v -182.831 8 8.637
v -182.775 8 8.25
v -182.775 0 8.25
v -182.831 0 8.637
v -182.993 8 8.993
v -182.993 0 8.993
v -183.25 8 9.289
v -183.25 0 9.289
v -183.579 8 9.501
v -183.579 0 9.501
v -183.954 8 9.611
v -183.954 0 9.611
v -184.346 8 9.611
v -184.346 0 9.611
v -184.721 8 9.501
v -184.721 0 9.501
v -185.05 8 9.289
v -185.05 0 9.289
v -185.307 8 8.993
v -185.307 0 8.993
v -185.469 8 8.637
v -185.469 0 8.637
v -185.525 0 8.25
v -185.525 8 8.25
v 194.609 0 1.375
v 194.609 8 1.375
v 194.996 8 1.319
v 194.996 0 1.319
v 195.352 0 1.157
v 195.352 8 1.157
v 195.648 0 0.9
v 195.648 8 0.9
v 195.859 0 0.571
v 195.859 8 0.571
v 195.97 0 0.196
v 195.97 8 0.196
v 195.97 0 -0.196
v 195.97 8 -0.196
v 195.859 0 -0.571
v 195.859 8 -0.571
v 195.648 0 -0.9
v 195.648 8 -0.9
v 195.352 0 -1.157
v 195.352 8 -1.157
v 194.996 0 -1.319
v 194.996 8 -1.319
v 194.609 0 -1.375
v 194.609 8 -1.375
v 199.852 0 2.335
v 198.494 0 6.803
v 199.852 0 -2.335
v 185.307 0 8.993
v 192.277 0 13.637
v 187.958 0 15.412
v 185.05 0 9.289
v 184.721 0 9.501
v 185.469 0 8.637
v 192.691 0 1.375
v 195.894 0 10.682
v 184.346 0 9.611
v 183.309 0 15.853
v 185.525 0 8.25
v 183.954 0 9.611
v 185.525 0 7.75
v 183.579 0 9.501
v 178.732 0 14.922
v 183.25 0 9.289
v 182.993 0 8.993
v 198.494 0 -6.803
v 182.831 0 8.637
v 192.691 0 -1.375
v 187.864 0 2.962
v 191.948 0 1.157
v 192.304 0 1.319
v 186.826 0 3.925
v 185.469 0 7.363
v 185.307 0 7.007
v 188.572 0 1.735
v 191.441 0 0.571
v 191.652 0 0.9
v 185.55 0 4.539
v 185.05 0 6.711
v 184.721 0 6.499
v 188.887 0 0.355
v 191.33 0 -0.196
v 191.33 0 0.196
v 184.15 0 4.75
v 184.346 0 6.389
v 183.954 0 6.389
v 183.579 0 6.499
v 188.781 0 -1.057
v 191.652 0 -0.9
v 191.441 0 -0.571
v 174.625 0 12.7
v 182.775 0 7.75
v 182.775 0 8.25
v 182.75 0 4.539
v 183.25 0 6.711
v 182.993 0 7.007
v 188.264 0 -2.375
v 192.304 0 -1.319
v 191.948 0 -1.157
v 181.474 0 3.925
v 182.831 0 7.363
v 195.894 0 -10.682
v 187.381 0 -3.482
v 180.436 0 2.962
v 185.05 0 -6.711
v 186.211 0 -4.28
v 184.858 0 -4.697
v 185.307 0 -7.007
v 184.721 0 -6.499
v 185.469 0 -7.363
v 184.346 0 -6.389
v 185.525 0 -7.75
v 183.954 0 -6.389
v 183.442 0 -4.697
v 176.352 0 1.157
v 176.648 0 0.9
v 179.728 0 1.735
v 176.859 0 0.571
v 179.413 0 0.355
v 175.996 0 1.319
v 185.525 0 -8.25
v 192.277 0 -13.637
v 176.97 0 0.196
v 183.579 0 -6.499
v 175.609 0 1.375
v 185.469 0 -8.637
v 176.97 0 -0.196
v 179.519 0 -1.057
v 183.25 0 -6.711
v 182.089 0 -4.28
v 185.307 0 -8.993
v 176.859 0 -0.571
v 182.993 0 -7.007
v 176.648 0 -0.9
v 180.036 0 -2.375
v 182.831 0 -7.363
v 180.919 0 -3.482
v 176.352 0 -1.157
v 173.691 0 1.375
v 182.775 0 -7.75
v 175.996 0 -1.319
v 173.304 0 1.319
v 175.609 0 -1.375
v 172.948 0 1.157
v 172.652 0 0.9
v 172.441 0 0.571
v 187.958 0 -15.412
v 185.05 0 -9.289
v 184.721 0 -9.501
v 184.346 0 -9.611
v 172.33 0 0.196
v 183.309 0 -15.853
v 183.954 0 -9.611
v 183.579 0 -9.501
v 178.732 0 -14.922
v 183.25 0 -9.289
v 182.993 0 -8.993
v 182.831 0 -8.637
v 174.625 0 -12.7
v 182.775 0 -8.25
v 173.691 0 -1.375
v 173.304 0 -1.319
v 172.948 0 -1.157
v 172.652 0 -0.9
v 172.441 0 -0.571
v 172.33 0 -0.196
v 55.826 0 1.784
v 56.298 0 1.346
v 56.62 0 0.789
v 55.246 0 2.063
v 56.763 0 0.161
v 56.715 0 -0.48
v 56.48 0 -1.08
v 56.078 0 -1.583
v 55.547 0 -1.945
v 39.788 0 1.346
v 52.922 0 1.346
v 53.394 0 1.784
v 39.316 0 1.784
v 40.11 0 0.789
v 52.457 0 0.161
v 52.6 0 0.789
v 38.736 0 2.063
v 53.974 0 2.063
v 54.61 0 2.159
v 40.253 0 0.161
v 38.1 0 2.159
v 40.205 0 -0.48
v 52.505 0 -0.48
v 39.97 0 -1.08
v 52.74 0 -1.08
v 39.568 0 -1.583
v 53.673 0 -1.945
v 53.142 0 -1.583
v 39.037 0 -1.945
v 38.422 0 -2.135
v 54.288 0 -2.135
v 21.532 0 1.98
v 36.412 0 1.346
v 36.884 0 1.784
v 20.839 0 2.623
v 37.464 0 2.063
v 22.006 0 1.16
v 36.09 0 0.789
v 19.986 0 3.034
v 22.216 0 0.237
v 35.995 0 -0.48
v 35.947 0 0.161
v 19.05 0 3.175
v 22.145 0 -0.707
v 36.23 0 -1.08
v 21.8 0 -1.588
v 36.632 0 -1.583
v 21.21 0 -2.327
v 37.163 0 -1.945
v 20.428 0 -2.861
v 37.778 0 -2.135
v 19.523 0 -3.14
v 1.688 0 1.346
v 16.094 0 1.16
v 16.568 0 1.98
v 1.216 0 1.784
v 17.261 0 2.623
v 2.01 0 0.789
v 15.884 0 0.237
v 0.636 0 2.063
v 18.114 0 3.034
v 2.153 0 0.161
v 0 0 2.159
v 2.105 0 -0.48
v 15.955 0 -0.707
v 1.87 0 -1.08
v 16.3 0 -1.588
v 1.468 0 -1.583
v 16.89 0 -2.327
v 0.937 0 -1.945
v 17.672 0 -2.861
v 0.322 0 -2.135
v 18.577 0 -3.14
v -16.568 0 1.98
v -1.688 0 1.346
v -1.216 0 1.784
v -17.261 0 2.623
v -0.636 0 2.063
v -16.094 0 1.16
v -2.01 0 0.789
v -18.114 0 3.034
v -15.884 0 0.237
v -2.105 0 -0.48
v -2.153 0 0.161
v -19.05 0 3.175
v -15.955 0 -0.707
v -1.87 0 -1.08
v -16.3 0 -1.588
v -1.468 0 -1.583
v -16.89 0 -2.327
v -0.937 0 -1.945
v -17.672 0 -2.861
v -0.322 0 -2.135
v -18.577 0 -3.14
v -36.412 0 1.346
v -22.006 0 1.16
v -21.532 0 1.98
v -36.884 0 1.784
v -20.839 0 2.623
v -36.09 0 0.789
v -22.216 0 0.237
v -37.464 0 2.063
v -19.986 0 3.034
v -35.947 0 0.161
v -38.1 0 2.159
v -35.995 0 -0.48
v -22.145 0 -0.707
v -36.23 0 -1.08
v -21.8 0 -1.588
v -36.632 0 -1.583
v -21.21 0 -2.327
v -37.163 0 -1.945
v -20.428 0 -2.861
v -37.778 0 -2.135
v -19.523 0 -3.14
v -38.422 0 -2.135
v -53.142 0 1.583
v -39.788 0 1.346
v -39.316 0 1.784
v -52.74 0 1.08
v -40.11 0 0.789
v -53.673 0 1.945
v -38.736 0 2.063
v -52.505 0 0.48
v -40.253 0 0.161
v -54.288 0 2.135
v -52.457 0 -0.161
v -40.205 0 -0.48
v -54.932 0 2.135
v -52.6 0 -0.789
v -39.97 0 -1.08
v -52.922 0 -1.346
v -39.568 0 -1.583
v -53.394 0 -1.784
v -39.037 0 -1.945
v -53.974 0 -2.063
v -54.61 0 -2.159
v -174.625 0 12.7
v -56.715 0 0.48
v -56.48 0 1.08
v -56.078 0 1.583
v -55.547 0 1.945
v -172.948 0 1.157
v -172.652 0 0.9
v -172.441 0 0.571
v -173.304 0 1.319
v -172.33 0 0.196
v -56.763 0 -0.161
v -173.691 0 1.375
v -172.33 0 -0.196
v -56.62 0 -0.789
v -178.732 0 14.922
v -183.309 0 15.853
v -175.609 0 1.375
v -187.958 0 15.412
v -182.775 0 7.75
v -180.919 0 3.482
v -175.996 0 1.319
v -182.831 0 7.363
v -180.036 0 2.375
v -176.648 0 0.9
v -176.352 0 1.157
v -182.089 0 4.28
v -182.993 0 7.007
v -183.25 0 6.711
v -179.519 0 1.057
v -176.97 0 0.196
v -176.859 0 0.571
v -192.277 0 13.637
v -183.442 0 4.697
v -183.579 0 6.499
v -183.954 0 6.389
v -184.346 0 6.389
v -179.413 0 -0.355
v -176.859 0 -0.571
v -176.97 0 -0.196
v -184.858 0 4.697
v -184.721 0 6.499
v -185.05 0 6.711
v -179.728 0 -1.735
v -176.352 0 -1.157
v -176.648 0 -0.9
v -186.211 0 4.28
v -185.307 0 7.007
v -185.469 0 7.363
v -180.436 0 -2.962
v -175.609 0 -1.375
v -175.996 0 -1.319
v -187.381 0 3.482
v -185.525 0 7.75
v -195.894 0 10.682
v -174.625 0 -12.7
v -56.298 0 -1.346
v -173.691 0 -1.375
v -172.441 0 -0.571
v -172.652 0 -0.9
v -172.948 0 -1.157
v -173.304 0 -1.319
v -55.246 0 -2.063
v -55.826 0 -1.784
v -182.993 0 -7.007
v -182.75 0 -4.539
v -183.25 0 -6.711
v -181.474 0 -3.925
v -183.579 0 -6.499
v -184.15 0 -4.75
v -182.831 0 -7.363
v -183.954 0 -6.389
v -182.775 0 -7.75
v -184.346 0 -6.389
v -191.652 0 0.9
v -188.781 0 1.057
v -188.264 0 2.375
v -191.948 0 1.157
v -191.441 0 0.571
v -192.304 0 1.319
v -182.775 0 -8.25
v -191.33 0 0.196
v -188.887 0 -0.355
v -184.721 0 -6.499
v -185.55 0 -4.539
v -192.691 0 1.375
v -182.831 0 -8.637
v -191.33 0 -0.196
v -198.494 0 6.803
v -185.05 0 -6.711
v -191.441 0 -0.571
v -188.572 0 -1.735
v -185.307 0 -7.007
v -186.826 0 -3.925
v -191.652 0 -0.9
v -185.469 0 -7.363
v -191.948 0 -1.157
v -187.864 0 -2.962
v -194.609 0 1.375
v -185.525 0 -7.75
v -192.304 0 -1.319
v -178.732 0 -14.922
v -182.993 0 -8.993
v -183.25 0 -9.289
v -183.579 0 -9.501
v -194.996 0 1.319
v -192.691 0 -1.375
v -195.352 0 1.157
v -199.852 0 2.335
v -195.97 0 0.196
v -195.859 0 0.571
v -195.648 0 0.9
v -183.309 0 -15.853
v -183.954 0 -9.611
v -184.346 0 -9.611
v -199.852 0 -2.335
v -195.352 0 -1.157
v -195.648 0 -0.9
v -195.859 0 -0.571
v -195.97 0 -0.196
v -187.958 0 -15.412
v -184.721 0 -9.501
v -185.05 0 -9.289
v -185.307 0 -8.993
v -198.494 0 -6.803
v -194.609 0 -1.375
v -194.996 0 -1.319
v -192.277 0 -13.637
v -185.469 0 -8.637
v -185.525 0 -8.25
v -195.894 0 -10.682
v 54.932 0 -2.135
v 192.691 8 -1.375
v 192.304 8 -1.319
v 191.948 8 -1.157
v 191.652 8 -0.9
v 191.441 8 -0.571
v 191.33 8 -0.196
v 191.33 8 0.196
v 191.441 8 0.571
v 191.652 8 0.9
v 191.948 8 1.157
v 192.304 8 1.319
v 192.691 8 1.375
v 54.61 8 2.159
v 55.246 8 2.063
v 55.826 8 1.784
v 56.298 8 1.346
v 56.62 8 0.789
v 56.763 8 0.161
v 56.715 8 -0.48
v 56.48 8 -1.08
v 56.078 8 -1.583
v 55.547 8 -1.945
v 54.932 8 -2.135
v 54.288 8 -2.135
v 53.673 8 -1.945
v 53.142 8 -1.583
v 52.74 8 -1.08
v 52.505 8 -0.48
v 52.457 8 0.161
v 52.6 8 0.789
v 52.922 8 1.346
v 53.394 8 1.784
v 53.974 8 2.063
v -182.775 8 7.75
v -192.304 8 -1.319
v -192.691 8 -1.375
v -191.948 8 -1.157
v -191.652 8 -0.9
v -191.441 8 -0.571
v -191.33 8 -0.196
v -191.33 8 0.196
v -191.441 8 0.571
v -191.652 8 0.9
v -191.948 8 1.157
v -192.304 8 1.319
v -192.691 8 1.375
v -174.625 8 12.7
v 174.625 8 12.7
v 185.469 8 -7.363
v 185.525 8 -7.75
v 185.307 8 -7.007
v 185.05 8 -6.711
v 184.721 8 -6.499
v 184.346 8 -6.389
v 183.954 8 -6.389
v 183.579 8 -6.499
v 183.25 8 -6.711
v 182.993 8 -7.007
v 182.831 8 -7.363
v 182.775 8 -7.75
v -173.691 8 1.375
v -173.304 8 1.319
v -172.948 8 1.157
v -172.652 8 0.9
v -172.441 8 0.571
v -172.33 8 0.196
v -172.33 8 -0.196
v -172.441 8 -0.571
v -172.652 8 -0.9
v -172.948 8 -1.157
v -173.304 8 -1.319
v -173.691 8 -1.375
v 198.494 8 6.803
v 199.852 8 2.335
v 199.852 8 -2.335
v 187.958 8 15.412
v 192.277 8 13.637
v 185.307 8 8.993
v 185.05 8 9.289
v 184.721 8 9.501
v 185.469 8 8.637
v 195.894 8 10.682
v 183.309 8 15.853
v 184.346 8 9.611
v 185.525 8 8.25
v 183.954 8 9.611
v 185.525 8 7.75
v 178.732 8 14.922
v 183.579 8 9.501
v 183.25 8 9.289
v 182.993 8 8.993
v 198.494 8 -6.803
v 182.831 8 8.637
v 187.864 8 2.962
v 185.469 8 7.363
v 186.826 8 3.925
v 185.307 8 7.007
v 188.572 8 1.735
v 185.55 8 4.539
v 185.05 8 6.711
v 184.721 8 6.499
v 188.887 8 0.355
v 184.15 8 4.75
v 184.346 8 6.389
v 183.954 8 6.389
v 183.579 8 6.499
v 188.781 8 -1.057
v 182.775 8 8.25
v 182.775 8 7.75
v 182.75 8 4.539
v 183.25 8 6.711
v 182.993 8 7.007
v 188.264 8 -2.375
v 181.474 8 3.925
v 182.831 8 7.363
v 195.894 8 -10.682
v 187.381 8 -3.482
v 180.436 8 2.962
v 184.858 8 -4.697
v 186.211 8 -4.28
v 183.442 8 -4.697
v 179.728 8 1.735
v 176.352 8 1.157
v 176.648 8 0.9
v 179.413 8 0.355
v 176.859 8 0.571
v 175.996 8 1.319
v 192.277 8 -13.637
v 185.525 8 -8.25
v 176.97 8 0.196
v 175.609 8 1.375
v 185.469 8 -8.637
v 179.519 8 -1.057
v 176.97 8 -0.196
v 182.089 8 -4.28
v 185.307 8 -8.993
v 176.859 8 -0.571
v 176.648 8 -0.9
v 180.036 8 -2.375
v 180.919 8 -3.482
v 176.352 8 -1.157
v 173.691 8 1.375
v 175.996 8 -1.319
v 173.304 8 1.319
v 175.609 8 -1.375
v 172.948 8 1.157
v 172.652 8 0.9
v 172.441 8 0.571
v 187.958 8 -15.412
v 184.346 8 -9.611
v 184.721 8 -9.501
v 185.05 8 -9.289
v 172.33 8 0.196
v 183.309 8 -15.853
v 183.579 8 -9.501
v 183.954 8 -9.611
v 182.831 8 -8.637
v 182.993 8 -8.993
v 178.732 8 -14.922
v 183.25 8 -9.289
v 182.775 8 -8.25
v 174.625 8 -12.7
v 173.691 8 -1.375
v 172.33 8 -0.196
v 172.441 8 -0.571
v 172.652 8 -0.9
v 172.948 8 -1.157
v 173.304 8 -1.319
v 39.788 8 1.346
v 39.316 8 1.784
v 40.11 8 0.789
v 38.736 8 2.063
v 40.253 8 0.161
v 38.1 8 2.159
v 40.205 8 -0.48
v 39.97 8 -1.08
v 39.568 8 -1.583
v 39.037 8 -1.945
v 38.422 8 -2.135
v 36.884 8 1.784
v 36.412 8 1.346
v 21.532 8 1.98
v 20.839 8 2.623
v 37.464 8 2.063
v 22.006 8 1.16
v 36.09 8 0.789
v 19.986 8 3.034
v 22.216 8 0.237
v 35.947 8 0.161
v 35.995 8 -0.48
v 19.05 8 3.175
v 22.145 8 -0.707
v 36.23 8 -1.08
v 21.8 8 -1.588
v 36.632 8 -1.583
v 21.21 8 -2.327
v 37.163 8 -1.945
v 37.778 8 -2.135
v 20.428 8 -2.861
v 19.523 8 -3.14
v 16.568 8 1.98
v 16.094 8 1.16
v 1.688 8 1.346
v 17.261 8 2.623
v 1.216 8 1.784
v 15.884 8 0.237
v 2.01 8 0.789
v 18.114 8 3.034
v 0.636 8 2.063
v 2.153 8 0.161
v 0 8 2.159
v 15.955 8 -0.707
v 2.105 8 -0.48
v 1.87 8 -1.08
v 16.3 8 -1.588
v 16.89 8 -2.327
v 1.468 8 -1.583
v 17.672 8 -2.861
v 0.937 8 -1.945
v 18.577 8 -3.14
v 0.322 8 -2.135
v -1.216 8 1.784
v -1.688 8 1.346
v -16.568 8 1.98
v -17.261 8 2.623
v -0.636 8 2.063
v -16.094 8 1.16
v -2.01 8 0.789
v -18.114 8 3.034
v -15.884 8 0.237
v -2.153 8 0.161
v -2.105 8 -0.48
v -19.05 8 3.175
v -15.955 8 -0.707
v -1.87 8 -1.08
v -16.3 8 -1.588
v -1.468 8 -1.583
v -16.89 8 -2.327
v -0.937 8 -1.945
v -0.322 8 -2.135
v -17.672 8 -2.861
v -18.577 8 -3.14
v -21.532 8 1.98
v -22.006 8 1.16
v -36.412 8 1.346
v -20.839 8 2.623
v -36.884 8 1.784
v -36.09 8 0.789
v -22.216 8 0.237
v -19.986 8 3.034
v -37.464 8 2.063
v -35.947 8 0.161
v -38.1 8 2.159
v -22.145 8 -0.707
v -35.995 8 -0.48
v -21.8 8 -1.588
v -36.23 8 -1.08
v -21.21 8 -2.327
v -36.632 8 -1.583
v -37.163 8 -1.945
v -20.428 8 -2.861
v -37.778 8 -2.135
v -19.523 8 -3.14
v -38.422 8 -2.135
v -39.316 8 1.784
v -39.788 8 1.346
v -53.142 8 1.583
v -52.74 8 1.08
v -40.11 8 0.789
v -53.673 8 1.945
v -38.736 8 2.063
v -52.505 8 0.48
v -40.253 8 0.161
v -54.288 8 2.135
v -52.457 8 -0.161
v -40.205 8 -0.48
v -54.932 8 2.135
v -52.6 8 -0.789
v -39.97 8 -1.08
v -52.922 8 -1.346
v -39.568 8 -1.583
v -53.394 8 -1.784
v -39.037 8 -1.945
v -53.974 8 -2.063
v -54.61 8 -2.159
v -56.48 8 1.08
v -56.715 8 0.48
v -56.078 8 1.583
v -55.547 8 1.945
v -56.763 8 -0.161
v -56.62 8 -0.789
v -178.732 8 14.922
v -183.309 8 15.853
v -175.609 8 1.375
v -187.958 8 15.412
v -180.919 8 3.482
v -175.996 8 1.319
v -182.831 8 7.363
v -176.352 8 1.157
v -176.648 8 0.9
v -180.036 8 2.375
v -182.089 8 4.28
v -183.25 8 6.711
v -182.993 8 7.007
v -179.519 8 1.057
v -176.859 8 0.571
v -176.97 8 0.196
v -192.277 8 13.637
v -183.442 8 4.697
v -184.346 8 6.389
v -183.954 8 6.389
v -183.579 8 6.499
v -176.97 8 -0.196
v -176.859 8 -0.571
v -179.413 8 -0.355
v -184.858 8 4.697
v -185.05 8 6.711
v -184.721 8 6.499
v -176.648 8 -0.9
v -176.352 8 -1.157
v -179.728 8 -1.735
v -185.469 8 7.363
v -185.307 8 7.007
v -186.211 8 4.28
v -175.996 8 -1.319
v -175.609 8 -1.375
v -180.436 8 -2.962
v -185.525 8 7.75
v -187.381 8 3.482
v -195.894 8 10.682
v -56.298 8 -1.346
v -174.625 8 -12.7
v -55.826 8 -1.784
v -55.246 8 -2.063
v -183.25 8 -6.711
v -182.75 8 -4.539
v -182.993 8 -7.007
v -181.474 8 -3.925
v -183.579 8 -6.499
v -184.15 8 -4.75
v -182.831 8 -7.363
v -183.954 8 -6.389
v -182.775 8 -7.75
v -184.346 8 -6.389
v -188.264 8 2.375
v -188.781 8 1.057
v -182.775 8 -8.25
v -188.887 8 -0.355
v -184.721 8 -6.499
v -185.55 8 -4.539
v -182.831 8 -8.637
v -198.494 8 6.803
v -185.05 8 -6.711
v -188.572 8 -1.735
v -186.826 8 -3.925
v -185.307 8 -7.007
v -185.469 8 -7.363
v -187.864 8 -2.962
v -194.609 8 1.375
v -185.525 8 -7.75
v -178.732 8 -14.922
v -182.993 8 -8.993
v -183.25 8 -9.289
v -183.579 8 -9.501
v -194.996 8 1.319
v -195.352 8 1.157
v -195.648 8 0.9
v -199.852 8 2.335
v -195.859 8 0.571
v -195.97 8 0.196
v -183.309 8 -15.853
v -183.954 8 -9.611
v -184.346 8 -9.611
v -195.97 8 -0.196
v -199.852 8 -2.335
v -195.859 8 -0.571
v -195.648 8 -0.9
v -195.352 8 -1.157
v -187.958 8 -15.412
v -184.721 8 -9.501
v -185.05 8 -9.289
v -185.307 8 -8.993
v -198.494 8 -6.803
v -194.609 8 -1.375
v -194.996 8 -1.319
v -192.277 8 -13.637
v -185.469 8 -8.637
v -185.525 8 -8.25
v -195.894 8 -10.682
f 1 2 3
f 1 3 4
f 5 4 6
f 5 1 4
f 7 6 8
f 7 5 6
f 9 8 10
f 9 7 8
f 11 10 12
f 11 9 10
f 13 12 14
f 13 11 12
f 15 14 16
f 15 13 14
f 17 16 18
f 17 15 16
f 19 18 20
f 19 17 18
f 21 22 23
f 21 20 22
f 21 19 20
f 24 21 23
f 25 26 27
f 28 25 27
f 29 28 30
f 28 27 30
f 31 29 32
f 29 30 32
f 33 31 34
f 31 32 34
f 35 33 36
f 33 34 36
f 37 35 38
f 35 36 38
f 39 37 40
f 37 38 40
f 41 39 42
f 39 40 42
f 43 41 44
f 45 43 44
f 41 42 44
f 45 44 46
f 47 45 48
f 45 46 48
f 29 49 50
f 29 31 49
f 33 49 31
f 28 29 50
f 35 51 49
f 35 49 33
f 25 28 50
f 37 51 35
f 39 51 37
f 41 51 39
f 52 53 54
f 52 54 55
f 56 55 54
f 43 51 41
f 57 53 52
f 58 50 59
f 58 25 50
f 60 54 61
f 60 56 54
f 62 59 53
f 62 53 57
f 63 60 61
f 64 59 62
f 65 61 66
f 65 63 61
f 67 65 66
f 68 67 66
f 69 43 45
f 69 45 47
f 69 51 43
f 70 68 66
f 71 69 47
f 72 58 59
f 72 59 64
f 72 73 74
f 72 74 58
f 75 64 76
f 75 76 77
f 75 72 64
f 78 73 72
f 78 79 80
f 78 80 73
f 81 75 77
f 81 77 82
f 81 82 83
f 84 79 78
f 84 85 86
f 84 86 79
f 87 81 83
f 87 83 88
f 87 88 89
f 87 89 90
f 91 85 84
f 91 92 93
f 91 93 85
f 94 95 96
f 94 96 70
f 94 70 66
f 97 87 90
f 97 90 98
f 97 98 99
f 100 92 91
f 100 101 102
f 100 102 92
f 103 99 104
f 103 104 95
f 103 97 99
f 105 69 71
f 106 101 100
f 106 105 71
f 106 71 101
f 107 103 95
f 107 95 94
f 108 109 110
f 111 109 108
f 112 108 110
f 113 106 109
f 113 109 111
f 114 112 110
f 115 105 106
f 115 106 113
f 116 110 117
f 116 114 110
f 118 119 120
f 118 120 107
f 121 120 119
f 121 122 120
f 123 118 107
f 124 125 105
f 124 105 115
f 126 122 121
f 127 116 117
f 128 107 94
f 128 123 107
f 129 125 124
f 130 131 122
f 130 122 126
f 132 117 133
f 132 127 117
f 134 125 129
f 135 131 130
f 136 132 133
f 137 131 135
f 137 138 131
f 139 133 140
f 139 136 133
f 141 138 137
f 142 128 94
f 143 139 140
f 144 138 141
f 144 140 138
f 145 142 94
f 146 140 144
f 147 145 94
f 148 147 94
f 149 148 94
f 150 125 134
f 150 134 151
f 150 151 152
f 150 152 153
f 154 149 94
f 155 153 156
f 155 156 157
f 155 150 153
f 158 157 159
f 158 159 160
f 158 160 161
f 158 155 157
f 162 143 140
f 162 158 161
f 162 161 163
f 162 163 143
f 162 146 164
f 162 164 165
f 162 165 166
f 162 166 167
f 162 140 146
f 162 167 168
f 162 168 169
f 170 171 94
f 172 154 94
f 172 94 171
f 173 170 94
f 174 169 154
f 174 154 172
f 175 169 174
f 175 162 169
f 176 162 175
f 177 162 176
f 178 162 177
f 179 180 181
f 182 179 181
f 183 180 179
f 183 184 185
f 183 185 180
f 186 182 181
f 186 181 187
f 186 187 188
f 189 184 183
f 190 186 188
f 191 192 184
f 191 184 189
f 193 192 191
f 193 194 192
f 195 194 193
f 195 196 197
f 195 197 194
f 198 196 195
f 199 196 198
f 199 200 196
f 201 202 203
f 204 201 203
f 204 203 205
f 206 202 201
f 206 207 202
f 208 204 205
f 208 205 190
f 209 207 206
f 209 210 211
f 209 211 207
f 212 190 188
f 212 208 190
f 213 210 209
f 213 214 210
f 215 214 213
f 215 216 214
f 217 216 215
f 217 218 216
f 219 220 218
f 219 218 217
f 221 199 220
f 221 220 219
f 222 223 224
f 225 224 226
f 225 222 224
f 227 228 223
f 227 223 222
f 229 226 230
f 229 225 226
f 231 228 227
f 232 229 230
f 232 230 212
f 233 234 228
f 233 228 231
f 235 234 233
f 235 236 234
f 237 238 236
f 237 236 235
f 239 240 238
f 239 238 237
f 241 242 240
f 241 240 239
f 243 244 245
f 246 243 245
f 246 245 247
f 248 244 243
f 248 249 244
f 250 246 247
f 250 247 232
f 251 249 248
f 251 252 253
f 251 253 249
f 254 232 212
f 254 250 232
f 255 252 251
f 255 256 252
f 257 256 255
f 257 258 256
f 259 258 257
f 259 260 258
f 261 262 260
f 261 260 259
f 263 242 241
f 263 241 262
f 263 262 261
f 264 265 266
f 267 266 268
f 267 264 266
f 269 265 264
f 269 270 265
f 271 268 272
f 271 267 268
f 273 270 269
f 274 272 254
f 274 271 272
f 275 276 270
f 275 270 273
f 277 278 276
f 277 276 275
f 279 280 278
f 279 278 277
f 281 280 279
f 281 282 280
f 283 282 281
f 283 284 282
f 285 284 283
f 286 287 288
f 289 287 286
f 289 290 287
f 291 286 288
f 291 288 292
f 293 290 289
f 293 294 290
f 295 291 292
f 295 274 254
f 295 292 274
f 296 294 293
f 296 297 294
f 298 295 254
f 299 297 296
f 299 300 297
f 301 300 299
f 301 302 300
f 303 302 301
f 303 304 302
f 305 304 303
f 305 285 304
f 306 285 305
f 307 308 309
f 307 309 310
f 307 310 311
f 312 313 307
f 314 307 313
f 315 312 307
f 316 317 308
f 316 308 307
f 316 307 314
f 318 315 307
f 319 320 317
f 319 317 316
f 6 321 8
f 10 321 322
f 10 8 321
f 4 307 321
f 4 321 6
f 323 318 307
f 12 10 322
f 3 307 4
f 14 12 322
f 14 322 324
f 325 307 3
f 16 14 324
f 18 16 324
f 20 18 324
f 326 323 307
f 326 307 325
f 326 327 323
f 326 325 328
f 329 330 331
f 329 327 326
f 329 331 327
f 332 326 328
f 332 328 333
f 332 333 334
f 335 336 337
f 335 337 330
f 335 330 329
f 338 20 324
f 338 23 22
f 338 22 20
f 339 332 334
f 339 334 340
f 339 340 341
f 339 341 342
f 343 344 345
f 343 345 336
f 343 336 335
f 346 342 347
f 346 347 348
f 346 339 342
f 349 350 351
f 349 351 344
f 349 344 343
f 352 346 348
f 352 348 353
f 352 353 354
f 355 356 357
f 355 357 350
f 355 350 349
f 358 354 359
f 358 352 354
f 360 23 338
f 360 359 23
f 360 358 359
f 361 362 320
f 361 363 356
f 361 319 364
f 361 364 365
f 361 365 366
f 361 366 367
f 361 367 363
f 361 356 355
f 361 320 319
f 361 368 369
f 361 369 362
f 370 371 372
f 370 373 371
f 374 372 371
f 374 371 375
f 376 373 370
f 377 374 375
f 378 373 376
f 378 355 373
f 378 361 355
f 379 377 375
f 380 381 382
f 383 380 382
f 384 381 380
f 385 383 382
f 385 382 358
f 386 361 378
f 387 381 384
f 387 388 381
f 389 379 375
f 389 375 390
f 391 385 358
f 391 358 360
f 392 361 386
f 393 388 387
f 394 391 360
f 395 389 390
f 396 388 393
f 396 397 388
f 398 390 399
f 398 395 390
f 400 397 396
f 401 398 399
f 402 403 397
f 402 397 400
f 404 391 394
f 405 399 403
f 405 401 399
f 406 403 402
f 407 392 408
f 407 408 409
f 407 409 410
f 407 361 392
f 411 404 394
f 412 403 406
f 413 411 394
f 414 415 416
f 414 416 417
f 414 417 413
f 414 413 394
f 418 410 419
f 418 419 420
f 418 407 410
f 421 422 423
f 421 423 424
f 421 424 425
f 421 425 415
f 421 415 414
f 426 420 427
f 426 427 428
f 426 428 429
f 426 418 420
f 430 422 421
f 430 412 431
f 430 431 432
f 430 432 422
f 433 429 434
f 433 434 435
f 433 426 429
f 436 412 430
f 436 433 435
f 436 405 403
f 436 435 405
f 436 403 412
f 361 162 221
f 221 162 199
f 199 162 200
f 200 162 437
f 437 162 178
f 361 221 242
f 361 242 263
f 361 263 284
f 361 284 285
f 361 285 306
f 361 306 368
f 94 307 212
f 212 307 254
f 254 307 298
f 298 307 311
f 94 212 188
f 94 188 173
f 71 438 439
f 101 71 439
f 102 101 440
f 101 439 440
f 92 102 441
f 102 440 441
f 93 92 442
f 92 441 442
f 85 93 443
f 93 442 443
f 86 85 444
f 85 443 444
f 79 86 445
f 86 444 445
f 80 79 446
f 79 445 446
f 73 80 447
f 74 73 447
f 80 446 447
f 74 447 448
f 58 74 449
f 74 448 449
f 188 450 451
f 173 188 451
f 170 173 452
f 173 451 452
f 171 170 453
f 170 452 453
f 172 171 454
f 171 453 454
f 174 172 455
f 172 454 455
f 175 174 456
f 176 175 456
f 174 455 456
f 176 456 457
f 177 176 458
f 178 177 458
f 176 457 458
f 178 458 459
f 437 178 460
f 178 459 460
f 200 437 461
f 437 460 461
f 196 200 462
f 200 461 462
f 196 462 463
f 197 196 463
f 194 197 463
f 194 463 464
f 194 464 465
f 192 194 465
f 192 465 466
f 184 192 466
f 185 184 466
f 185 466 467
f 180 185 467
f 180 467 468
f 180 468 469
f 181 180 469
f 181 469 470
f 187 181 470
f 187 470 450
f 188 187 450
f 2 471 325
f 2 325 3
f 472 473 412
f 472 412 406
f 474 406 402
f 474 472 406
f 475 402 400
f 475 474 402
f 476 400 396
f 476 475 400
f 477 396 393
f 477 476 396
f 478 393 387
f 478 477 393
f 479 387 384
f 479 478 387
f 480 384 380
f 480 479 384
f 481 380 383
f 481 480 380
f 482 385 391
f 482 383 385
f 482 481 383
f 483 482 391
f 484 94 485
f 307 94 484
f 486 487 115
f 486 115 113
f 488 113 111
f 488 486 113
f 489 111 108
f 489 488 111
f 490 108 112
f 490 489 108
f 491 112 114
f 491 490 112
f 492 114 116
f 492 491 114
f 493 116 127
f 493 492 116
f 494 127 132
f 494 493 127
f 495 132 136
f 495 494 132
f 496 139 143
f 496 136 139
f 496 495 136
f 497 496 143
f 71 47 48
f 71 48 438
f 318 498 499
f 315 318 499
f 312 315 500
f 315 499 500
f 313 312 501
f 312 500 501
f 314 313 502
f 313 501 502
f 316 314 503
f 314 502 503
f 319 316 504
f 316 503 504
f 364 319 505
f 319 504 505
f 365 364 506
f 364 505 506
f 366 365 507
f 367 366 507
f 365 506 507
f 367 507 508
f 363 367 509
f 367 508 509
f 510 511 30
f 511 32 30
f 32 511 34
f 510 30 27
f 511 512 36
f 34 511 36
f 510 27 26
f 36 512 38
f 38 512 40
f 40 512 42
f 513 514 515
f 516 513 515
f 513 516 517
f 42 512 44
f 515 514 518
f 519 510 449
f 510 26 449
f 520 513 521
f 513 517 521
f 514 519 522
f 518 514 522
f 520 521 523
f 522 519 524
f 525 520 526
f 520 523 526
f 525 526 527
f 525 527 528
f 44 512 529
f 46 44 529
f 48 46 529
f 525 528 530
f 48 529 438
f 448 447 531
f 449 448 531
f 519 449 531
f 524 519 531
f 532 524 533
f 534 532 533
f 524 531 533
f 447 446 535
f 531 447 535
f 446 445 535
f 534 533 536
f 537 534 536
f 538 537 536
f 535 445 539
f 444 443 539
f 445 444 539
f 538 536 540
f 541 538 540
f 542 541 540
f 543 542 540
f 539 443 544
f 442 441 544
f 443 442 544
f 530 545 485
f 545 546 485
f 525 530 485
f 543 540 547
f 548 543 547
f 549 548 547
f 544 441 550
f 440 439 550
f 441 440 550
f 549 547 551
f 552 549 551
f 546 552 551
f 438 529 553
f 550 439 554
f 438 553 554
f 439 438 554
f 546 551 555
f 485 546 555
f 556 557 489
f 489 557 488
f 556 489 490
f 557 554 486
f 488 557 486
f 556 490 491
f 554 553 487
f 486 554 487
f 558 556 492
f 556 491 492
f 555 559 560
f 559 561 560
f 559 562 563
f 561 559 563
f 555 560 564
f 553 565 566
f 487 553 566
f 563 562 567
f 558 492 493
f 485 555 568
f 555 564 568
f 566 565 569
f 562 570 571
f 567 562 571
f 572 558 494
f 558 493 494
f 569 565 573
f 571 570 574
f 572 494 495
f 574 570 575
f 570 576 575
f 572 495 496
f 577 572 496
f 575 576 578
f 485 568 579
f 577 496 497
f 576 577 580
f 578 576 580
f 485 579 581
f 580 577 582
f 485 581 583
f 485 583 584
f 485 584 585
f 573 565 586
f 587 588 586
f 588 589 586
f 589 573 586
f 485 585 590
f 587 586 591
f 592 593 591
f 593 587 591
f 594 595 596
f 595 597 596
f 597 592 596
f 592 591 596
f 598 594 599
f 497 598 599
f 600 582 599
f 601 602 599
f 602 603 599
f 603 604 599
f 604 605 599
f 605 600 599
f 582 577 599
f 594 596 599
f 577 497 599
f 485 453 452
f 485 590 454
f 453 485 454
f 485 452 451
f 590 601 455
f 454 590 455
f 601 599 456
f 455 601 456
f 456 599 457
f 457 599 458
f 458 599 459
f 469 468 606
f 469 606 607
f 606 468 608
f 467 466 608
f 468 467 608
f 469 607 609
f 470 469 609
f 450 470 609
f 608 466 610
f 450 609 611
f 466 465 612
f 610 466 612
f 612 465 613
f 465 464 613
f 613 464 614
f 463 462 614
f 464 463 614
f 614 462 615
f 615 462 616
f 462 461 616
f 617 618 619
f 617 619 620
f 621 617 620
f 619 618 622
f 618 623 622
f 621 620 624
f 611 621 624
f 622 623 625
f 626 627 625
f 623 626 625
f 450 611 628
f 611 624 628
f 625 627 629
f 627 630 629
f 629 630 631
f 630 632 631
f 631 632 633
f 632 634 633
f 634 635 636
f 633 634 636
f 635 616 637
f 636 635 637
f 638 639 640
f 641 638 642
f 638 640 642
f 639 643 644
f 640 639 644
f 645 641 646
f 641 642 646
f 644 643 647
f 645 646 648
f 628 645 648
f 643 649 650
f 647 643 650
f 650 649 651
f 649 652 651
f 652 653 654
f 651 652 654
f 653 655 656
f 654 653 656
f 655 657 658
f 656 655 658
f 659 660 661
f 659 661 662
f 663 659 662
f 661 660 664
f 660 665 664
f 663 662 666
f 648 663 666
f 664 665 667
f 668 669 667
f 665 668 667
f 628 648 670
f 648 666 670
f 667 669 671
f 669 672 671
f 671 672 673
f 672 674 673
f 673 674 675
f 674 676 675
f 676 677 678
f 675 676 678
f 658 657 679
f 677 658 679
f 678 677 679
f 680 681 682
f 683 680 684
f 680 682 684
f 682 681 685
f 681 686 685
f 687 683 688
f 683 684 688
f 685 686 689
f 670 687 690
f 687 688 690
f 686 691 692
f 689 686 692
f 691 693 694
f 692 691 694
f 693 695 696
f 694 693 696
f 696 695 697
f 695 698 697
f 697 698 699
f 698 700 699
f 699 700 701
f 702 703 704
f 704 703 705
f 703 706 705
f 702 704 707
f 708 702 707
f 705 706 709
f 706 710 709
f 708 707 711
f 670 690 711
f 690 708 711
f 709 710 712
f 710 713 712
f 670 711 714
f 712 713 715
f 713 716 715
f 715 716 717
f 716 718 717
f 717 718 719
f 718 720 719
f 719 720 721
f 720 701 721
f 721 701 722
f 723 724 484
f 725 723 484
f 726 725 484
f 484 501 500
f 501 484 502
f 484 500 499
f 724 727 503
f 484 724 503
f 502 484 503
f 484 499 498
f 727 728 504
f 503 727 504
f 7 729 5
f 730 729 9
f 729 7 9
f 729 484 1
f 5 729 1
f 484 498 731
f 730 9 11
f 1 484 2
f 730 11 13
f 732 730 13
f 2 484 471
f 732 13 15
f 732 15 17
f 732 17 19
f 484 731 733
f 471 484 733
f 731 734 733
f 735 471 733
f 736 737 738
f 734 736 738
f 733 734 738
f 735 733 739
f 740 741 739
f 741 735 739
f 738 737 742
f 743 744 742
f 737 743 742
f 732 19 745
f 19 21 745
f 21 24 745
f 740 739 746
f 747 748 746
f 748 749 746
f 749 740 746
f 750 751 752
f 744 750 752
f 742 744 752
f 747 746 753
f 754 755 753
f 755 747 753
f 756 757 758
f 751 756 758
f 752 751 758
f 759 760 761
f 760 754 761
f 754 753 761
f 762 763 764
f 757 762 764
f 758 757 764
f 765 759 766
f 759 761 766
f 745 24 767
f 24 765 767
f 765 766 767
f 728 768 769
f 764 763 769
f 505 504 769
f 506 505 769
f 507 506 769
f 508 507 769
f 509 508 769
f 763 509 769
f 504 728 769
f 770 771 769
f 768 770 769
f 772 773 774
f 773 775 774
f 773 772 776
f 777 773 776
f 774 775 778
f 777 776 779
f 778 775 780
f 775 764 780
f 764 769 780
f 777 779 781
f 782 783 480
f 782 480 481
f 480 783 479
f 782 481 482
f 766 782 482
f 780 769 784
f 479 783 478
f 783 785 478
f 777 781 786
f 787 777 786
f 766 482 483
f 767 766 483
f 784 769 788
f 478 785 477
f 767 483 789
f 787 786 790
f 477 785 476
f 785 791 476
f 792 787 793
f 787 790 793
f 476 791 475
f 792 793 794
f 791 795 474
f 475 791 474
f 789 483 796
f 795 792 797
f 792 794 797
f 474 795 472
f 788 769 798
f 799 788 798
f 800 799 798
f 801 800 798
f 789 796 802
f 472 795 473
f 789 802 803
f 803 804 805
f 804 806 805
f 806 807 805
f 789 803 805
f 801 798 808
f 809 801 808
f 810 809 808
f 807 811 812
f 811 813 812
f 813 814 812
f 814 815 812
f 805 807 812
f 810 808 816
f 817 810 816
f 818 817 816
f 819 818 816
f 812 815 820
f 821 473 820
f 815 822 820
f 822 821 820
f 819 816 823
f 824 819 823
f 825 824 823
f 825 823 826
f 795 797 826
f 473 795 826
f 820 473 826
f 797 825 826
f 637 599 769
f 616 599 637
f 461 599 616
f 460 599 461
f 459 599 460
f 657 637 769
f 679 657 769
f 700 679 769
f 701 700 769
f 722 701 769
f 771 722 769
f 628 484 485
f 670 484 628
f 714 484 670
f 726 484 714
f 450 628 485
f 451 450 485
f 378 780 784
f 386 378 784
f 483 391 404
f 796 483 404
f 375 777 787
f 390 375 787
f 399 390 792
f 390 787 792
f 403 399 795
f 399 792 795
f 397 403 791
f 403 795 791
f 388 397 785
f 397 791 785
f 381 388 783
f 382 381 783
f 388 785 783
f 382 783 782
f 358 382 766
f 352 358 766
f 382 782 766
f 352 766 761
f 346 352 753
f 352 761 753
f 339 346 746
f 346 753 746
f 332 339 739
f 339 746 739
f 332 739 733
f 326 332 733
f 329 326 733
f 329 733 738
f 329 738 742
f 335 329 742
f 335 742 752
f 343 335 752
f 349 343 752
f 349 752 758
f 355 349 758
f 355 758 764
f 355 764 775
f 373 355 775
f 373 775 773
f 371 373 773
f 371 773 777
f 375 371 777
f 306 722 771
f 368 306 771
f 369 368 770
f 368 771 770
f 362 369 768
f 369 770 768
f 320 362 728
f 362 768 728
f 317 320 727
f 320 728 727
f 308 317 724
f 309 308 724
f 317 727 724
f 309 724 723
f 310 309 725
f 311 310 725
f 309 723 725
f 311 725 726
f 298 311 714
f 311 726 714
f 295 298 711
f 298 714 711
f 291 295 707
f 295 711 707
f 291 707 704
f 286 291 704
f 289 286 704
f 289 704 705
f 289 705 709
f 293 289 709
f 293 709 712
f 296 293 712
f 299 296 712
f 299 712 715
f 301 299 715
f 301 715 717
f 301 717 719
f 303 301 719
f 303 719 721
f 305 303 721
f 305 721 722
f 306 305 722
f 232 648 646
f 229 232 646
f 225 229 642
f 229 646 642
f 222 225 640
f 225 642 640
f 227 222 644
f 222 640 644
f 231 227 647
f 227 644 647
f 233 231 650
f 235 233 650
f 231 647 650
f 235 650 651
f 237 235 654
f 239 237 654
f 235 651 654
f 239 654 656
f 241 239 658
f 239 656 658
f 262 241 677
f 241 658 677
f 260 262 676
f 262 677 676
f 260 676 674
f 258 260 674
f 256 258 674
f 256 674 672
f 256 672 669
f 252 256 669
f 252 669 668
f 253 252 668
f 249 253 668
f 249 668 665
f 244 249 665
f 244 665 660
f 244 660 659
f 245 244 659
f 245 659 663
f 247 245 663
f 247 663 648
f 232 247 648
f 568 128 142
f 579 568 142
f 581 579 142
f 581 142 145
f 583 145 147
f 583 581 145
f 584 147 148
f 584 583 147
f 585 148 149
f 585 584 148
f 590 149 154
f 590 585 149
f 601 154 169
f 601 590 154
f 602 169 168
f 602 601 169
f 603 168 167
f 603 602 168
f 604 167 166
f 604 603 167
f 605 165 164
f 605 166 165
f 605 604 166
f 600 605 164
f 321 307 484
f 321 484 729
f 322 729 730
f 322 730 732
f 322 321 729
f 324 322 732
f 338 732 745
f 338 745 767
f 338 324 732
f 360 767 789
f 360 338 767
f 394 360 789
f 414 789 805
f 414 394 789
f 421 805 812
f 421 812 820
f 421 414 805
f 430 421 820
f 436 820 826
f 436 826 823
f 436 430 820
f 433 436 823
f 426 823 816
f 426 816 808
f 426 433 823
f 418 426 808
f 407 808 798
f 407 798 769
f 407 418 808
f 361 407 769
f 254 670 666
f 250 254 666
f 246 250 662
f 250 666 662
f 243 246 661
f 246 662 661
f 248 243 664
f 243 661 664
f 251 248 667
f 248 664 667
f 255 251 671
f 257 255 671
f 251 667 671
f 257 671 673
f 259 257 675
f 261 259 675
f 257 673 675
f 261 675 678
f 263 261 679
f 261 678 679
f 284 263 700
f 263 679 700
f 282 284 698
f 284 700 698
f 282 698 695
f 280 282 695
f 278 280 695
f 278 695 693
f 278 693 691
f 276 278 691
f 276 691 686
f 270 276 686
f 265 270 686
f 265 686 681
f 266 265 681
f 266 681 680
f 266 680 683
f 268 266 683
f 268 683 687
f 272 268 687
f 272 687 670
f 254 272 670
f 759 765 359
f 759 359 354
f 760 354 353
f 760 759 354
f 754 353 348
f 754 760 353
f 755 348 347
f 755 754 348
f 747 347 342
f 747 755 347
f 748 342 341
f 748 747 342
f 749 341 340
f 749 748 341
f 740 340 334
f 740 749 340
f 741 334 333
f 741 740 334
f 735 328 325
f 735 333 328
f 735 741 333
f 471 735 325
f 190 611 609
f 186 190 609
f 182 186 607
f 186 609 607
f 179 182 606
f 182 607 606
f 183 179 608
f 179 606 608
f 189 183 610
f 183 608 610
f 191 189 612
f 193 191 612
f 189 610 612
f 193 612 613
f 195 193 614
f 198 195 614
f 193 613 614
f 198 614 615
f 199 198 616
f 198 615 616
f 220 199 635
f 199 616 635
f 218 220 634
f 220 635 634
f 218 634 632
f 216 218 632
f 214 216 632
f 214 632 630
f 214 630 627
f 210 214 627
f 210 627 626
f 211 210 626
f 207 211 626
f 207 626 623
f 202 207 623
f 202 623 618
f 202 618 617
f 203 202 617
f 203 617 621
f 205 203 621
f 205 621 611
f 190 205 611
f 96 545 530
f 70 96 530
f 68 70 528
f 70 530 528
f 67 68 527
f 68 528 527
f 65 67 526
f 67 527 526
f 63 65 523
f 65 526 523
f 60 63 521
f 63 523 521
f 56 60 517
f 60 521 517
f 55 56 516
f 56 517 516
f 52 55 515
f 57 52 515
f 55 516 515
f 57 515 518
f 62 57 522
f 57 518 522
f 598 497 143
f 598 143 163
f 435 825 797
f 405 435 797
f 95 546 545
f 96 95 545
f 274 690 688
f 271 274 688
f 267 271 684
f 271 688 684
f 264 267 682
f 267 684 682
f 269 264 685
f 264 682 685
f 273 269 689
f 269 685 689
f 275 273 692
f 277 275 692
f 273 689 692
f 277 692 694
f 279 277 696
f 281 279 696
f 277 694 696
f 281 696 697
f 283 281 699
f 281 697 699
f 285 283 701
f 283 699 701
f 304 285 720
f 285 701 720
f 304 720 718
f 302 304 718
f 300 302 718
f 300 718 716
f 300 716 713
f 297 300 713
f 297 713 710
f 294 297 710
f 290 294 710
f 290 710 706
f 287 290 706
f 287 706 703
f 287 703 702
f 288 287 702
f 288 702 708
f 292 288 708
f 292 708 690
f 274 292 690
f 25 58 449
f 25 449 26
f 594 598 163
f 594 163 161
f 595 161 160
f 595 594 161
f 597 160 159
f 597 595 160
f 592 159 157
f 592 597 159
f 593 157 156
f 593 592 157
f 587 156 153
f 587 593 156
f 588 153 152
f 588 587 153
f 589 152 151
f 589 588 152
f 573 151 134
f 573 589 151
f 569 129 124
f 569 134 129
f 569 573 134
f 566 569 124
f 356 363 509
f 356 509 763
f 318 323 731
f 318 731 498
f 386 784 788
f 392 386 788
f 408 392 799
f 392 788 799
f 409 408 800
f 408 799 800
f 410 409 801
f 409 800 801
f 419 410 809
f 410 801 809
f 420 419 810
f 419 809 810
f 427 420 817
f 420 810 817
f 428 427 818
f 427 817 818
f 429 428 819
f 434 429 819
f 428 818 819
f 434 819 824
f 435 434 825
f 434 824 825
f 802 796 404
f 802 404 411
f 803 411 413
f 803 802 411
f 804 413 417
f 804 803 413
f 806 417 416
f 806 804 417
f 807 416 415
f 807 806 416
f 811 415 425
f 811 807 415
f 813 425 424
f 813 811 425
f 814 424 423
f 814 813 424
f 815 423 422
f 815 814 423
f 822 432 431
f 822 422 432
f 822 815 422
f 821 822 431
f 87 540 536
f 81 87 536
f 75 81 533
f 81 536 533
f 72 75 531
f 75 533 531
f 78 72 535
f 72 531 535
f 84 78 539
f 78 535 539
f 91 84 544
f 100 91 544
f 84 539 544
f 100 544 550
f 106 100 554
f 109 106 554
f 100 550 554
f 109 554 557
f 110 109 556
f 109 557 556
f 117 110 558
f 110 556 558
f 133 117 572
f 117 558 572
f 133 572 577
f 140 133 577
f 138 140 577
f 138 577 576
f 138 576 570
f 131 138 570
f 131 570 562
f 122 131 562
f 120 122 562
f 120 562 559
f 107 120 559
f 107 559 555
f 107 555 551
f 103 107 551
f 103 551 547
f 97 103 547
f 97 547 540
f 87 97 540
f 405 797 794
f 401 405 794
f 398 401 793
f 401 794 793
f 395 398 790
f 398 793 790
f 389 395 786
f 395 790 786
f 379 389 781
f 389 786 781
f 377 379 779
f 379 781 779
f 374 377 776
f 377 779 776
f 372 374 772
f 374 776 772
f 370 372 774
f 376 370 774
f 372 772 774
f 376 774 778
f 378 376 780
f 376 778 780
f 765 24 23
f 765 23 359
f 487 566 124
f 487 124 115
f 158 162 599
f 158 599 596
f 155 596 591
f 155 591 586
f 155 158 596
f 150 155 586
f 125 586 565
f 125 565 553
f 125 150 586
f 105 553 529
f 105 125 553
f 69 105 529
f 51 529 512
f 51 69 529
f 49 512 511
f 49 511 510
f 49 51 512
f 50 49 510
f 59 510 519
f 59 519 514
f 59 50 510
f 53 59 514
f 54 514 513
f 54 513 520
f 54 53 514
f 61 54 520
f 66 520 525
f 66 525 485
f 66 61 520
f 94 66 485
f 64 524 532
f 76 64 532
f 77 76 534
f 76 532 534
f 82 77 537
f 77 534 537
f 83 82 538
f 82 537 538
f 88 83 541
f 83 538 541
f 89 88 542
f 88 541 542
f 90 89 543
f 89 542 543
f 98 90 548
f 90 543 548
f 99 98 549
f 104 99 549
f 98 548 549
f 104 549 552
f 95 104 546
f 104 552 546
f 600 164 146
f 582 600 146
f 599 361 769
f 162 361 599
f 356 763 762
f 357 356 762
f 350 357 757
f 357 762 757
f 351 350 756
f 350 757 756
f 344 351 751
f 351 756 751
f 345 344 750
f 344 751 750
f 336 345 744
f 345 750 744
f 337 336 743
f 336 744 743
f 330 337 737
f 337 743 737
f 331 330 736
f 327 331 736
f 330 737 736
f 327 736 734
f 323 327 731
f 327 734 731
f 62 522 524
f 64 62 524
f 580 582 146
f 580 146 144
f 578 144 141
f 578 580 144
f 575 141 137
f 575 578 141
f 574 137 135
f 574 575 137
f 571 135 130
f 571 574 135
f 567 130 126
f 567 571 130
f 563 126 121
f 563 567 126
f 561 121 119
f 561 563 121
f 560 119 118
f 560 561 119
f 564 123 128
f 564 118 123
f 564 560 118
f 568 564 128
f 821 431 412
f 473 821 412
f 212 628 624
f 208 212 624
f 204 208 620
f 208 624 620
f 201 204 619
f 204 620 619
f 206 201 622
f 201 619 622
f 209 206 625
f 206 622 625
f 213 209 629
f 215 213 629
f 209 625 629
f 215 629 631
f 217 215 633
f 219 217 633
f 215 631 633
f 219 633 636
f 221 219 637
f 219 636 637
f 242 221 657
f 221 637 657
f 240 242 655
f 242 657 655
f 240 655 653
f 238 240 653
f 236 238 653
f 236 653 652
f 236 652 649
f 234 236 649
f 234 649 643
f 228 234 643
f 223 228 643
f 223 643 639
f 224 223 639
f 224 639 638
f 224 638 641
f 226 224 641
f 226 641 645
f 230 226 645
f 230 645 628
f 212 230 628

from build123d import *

# Parameters (mm, degrees)
BOSS_EXTRUDE1_DEPTH = 8
SKETCH2_R           = 4.75
CUT_EXTRUDE1_DEPTH  = 201.81338663
SKETCH3_R           = 2.159
CUT_EXTRUDE2_DEPTH  = 201.81338663
SKETCH4_R           = 3.175
CUT_EXTRUDE3_DEPTH  = 201.81338663
SKETCH5_R           = 2.159
CUT_EXTRUDE4_DEPTH  = 201.81338663


with BuildPart() as part:
    # Sketch1 → Boss-Extrude1 (new body)
    with BuildSketch(Plane(origin=(0, 0, 0), x_dir=(1, 0, 0), z_dir=(0, 1, 0))):
        with BuildLine():
            Line((-174.625, 12.7), (174.625, 12.7))
            ThreePointArc((174.625, 12.7), (200.025, 0), (174.625, -12.7))
            Line((174.625, -12.7), (-174.625, -12.7))
            ThreePointArc((-174.625, -12.7), (-200.025, 0), (-174.625, 12.7))
        make_face()
    extrude(amount=BOSS_EXTRUDE1_DEPTH)

    # Sketch2 → Cut-Extrude1 (cut, through all)
    with BuildSketch(Plane(origin=(0, 8, 0), x_dir=(1, 0, 0), z_dir=(0, 1, 0))):
        with Locations(Location((184.15, 0, 0), (0, 0, 270))):
            Circle(SKETCH2_R)
        with Locations(Location((-184.15, 0, 0), (0, 0, 90))):
            Circle(SKETCH2_R)
        with BuildLine():
            Line((173.691383345, 1.375), (175.608616655, 1.375))
            ThreePointArc((175.608616655, 1.375), (176.983616655, 0), (175.608616655, -1.375))
            Line((175.608616655, -1.375), (173.691383345, -1.375))
            ThreePointArc((173.691383345, -1.375), (172.316383345, 0), (173.691383345, 1.375))
        make_face()
        with BuildLine():
            Line((194.608616655, 1.375), (192.691383345, 1.375))
            ThreePointArc((192.691383345, 1.375), (191.316383345, 0), (192.691383345, -1.375))
            Line((192.691383345, -1.375), (194.608616655, -1.375))
            ThreePointArc((194.608616655, -1.375), (195.983616655, 0), (194.608616655, 1.375))
        make_face()
        with BuildLine():
            Line((185.525, 8.25), (185.525, 7.75))
            ThreePointArc((185.525, 7.75), (184.15, 6.375), (182.775, 7.75))
            Line((182.775, 7.75), (182.775, 8.25))
            ThreePointArc((182.775, 8.25), (184.15, 9.625), (185.525, 8.25))
        make_face()
        with BuildLine():
            Line((185.525, -8.25), (185.525, -7.75))
            ThreePointArc((185.525, -7.75), (184.15, -6.375), (182.775, -7.75))
            Line((182.775, -7.75), (182.775, -8.25))
            ThreePointArc((182.775, -8.25), (184.15, -9.625), (185.525, -8.25))
        make_face()
        with BuildLine():
            Line((-185.525, -8.25), (-185.525, -7.75))
            ThreePointArc((-185.525, -7.75), (-184.15, -6.375), (-182.775, -7.75))
            Line((-182.775, -7.75), (-182.775, -8.25))
            ThreePointArc((-182.775, -8.25), (-184.15, -9.625), (-185.525, -8.25))
        make_face()
        with BuildLine():
            Line((-185.525, 8.25), (-185.525, 7.75))
            ThreePointArc((-185.525, 7.75), (-184.15, 6.375), (-182.775, 7.75))
            Line((-182.775, 7.75), (-182.775, 8.25))
            ThreePointArc((-182.775, 8.25), (-184.15, 9.625), (-185.525, 8.25))
        make_face()
        with BuildLine():
            Line((-194.608616655, 1.375), (-192.691383345, 1.375))
            ThreePointArc((-192.691383345, 1.375), (-191.316383345, 0), (-192.691383345, -1.375))
            Line((-192.691383345, -1.375), (-194.608616655, -1.375))
            ThreePointArc((-194.608616655, -1.375), (-195.983616655, 0), (-194.608616655, 1.375))
        make_face()
        with BuildLine():
            Line((-173.691383345, 1.375), (-175.608616655, 1.375))
            ThreePointArc((-175.608616655, 1.375), (-176.983616655, 0), (-175.608616655, -1.375))
            Line((-175.608616655, -1.375), (-173.691383345, -1.375))
            ThreePointArc((-173.691383345, -1.375), (-172.316383345, 0), (-173.691383345, 1.375))
        make_face()
    extrude(amount=-CUT_EXTRUDE1_DEPTH, mode=Mode.SUBTRACT)

    # Sketch3 → Cut-Extrude2 (cut, through all)
    with BuildSketch(Plane(origin=(0, 8, 0), x_dir=(1, 0, 0), z_dir=(0, 1, 0))):
        with Locations(Location((0, 0, 0), (0, 0, 270))):
            Circle(SKETCH3_R)
        with Locations(Location((38.1, 0, 0), (0, 0, 270))):
            Circle(SKETCH3_R)
        with Locations(Location((-38.1, 0, 0), (0, 0, 270))):
            Circle(SKETCH3_R)
    extrude(amount=-CUT_EXTRUDE2_DEPTH, mode=Mode.SUBTRACT)

    # Sketch4 → Cut-Extrude3 (cut, through all)
    with BuildSketch(Plane(origin=(0, 8, 0), x_dir=(1, 0, 0), z_dir=(0, 1, 0))):
        with Locations(Location((-19.05, 0, 0), (0, 0, 270))):
            Circle(SKETCH4_R)
        with Locations(Location((19.05, 0, 0), (0, 0, 270))):
            Circle(SKETCH4_R)
    extrude(amount=-CUT_EXTRUDE3_DEPTH, mode=Mode.SUBTRACT)

    # Sketch5 → Cut-Extrude4 (cut, through all)
    with BuildSketch(Plane(origin=(0, 8, 0), x_dir=(1, 0, 0), z_dir=(0, 1, 0))):
        with Locations(Location((54.61, 0, 0), (0, 0, 270))):
            Circle(SKETCH5_R)
        with Locations(Location((-54.61, 0, 0), (0, 0, 90))):
            Circle(SKETCH5_R)
    extrude(amount=-CUT_EXTRUDE4_DEPTH, mode=Mode.SUBTRACT)


solid = part.part
